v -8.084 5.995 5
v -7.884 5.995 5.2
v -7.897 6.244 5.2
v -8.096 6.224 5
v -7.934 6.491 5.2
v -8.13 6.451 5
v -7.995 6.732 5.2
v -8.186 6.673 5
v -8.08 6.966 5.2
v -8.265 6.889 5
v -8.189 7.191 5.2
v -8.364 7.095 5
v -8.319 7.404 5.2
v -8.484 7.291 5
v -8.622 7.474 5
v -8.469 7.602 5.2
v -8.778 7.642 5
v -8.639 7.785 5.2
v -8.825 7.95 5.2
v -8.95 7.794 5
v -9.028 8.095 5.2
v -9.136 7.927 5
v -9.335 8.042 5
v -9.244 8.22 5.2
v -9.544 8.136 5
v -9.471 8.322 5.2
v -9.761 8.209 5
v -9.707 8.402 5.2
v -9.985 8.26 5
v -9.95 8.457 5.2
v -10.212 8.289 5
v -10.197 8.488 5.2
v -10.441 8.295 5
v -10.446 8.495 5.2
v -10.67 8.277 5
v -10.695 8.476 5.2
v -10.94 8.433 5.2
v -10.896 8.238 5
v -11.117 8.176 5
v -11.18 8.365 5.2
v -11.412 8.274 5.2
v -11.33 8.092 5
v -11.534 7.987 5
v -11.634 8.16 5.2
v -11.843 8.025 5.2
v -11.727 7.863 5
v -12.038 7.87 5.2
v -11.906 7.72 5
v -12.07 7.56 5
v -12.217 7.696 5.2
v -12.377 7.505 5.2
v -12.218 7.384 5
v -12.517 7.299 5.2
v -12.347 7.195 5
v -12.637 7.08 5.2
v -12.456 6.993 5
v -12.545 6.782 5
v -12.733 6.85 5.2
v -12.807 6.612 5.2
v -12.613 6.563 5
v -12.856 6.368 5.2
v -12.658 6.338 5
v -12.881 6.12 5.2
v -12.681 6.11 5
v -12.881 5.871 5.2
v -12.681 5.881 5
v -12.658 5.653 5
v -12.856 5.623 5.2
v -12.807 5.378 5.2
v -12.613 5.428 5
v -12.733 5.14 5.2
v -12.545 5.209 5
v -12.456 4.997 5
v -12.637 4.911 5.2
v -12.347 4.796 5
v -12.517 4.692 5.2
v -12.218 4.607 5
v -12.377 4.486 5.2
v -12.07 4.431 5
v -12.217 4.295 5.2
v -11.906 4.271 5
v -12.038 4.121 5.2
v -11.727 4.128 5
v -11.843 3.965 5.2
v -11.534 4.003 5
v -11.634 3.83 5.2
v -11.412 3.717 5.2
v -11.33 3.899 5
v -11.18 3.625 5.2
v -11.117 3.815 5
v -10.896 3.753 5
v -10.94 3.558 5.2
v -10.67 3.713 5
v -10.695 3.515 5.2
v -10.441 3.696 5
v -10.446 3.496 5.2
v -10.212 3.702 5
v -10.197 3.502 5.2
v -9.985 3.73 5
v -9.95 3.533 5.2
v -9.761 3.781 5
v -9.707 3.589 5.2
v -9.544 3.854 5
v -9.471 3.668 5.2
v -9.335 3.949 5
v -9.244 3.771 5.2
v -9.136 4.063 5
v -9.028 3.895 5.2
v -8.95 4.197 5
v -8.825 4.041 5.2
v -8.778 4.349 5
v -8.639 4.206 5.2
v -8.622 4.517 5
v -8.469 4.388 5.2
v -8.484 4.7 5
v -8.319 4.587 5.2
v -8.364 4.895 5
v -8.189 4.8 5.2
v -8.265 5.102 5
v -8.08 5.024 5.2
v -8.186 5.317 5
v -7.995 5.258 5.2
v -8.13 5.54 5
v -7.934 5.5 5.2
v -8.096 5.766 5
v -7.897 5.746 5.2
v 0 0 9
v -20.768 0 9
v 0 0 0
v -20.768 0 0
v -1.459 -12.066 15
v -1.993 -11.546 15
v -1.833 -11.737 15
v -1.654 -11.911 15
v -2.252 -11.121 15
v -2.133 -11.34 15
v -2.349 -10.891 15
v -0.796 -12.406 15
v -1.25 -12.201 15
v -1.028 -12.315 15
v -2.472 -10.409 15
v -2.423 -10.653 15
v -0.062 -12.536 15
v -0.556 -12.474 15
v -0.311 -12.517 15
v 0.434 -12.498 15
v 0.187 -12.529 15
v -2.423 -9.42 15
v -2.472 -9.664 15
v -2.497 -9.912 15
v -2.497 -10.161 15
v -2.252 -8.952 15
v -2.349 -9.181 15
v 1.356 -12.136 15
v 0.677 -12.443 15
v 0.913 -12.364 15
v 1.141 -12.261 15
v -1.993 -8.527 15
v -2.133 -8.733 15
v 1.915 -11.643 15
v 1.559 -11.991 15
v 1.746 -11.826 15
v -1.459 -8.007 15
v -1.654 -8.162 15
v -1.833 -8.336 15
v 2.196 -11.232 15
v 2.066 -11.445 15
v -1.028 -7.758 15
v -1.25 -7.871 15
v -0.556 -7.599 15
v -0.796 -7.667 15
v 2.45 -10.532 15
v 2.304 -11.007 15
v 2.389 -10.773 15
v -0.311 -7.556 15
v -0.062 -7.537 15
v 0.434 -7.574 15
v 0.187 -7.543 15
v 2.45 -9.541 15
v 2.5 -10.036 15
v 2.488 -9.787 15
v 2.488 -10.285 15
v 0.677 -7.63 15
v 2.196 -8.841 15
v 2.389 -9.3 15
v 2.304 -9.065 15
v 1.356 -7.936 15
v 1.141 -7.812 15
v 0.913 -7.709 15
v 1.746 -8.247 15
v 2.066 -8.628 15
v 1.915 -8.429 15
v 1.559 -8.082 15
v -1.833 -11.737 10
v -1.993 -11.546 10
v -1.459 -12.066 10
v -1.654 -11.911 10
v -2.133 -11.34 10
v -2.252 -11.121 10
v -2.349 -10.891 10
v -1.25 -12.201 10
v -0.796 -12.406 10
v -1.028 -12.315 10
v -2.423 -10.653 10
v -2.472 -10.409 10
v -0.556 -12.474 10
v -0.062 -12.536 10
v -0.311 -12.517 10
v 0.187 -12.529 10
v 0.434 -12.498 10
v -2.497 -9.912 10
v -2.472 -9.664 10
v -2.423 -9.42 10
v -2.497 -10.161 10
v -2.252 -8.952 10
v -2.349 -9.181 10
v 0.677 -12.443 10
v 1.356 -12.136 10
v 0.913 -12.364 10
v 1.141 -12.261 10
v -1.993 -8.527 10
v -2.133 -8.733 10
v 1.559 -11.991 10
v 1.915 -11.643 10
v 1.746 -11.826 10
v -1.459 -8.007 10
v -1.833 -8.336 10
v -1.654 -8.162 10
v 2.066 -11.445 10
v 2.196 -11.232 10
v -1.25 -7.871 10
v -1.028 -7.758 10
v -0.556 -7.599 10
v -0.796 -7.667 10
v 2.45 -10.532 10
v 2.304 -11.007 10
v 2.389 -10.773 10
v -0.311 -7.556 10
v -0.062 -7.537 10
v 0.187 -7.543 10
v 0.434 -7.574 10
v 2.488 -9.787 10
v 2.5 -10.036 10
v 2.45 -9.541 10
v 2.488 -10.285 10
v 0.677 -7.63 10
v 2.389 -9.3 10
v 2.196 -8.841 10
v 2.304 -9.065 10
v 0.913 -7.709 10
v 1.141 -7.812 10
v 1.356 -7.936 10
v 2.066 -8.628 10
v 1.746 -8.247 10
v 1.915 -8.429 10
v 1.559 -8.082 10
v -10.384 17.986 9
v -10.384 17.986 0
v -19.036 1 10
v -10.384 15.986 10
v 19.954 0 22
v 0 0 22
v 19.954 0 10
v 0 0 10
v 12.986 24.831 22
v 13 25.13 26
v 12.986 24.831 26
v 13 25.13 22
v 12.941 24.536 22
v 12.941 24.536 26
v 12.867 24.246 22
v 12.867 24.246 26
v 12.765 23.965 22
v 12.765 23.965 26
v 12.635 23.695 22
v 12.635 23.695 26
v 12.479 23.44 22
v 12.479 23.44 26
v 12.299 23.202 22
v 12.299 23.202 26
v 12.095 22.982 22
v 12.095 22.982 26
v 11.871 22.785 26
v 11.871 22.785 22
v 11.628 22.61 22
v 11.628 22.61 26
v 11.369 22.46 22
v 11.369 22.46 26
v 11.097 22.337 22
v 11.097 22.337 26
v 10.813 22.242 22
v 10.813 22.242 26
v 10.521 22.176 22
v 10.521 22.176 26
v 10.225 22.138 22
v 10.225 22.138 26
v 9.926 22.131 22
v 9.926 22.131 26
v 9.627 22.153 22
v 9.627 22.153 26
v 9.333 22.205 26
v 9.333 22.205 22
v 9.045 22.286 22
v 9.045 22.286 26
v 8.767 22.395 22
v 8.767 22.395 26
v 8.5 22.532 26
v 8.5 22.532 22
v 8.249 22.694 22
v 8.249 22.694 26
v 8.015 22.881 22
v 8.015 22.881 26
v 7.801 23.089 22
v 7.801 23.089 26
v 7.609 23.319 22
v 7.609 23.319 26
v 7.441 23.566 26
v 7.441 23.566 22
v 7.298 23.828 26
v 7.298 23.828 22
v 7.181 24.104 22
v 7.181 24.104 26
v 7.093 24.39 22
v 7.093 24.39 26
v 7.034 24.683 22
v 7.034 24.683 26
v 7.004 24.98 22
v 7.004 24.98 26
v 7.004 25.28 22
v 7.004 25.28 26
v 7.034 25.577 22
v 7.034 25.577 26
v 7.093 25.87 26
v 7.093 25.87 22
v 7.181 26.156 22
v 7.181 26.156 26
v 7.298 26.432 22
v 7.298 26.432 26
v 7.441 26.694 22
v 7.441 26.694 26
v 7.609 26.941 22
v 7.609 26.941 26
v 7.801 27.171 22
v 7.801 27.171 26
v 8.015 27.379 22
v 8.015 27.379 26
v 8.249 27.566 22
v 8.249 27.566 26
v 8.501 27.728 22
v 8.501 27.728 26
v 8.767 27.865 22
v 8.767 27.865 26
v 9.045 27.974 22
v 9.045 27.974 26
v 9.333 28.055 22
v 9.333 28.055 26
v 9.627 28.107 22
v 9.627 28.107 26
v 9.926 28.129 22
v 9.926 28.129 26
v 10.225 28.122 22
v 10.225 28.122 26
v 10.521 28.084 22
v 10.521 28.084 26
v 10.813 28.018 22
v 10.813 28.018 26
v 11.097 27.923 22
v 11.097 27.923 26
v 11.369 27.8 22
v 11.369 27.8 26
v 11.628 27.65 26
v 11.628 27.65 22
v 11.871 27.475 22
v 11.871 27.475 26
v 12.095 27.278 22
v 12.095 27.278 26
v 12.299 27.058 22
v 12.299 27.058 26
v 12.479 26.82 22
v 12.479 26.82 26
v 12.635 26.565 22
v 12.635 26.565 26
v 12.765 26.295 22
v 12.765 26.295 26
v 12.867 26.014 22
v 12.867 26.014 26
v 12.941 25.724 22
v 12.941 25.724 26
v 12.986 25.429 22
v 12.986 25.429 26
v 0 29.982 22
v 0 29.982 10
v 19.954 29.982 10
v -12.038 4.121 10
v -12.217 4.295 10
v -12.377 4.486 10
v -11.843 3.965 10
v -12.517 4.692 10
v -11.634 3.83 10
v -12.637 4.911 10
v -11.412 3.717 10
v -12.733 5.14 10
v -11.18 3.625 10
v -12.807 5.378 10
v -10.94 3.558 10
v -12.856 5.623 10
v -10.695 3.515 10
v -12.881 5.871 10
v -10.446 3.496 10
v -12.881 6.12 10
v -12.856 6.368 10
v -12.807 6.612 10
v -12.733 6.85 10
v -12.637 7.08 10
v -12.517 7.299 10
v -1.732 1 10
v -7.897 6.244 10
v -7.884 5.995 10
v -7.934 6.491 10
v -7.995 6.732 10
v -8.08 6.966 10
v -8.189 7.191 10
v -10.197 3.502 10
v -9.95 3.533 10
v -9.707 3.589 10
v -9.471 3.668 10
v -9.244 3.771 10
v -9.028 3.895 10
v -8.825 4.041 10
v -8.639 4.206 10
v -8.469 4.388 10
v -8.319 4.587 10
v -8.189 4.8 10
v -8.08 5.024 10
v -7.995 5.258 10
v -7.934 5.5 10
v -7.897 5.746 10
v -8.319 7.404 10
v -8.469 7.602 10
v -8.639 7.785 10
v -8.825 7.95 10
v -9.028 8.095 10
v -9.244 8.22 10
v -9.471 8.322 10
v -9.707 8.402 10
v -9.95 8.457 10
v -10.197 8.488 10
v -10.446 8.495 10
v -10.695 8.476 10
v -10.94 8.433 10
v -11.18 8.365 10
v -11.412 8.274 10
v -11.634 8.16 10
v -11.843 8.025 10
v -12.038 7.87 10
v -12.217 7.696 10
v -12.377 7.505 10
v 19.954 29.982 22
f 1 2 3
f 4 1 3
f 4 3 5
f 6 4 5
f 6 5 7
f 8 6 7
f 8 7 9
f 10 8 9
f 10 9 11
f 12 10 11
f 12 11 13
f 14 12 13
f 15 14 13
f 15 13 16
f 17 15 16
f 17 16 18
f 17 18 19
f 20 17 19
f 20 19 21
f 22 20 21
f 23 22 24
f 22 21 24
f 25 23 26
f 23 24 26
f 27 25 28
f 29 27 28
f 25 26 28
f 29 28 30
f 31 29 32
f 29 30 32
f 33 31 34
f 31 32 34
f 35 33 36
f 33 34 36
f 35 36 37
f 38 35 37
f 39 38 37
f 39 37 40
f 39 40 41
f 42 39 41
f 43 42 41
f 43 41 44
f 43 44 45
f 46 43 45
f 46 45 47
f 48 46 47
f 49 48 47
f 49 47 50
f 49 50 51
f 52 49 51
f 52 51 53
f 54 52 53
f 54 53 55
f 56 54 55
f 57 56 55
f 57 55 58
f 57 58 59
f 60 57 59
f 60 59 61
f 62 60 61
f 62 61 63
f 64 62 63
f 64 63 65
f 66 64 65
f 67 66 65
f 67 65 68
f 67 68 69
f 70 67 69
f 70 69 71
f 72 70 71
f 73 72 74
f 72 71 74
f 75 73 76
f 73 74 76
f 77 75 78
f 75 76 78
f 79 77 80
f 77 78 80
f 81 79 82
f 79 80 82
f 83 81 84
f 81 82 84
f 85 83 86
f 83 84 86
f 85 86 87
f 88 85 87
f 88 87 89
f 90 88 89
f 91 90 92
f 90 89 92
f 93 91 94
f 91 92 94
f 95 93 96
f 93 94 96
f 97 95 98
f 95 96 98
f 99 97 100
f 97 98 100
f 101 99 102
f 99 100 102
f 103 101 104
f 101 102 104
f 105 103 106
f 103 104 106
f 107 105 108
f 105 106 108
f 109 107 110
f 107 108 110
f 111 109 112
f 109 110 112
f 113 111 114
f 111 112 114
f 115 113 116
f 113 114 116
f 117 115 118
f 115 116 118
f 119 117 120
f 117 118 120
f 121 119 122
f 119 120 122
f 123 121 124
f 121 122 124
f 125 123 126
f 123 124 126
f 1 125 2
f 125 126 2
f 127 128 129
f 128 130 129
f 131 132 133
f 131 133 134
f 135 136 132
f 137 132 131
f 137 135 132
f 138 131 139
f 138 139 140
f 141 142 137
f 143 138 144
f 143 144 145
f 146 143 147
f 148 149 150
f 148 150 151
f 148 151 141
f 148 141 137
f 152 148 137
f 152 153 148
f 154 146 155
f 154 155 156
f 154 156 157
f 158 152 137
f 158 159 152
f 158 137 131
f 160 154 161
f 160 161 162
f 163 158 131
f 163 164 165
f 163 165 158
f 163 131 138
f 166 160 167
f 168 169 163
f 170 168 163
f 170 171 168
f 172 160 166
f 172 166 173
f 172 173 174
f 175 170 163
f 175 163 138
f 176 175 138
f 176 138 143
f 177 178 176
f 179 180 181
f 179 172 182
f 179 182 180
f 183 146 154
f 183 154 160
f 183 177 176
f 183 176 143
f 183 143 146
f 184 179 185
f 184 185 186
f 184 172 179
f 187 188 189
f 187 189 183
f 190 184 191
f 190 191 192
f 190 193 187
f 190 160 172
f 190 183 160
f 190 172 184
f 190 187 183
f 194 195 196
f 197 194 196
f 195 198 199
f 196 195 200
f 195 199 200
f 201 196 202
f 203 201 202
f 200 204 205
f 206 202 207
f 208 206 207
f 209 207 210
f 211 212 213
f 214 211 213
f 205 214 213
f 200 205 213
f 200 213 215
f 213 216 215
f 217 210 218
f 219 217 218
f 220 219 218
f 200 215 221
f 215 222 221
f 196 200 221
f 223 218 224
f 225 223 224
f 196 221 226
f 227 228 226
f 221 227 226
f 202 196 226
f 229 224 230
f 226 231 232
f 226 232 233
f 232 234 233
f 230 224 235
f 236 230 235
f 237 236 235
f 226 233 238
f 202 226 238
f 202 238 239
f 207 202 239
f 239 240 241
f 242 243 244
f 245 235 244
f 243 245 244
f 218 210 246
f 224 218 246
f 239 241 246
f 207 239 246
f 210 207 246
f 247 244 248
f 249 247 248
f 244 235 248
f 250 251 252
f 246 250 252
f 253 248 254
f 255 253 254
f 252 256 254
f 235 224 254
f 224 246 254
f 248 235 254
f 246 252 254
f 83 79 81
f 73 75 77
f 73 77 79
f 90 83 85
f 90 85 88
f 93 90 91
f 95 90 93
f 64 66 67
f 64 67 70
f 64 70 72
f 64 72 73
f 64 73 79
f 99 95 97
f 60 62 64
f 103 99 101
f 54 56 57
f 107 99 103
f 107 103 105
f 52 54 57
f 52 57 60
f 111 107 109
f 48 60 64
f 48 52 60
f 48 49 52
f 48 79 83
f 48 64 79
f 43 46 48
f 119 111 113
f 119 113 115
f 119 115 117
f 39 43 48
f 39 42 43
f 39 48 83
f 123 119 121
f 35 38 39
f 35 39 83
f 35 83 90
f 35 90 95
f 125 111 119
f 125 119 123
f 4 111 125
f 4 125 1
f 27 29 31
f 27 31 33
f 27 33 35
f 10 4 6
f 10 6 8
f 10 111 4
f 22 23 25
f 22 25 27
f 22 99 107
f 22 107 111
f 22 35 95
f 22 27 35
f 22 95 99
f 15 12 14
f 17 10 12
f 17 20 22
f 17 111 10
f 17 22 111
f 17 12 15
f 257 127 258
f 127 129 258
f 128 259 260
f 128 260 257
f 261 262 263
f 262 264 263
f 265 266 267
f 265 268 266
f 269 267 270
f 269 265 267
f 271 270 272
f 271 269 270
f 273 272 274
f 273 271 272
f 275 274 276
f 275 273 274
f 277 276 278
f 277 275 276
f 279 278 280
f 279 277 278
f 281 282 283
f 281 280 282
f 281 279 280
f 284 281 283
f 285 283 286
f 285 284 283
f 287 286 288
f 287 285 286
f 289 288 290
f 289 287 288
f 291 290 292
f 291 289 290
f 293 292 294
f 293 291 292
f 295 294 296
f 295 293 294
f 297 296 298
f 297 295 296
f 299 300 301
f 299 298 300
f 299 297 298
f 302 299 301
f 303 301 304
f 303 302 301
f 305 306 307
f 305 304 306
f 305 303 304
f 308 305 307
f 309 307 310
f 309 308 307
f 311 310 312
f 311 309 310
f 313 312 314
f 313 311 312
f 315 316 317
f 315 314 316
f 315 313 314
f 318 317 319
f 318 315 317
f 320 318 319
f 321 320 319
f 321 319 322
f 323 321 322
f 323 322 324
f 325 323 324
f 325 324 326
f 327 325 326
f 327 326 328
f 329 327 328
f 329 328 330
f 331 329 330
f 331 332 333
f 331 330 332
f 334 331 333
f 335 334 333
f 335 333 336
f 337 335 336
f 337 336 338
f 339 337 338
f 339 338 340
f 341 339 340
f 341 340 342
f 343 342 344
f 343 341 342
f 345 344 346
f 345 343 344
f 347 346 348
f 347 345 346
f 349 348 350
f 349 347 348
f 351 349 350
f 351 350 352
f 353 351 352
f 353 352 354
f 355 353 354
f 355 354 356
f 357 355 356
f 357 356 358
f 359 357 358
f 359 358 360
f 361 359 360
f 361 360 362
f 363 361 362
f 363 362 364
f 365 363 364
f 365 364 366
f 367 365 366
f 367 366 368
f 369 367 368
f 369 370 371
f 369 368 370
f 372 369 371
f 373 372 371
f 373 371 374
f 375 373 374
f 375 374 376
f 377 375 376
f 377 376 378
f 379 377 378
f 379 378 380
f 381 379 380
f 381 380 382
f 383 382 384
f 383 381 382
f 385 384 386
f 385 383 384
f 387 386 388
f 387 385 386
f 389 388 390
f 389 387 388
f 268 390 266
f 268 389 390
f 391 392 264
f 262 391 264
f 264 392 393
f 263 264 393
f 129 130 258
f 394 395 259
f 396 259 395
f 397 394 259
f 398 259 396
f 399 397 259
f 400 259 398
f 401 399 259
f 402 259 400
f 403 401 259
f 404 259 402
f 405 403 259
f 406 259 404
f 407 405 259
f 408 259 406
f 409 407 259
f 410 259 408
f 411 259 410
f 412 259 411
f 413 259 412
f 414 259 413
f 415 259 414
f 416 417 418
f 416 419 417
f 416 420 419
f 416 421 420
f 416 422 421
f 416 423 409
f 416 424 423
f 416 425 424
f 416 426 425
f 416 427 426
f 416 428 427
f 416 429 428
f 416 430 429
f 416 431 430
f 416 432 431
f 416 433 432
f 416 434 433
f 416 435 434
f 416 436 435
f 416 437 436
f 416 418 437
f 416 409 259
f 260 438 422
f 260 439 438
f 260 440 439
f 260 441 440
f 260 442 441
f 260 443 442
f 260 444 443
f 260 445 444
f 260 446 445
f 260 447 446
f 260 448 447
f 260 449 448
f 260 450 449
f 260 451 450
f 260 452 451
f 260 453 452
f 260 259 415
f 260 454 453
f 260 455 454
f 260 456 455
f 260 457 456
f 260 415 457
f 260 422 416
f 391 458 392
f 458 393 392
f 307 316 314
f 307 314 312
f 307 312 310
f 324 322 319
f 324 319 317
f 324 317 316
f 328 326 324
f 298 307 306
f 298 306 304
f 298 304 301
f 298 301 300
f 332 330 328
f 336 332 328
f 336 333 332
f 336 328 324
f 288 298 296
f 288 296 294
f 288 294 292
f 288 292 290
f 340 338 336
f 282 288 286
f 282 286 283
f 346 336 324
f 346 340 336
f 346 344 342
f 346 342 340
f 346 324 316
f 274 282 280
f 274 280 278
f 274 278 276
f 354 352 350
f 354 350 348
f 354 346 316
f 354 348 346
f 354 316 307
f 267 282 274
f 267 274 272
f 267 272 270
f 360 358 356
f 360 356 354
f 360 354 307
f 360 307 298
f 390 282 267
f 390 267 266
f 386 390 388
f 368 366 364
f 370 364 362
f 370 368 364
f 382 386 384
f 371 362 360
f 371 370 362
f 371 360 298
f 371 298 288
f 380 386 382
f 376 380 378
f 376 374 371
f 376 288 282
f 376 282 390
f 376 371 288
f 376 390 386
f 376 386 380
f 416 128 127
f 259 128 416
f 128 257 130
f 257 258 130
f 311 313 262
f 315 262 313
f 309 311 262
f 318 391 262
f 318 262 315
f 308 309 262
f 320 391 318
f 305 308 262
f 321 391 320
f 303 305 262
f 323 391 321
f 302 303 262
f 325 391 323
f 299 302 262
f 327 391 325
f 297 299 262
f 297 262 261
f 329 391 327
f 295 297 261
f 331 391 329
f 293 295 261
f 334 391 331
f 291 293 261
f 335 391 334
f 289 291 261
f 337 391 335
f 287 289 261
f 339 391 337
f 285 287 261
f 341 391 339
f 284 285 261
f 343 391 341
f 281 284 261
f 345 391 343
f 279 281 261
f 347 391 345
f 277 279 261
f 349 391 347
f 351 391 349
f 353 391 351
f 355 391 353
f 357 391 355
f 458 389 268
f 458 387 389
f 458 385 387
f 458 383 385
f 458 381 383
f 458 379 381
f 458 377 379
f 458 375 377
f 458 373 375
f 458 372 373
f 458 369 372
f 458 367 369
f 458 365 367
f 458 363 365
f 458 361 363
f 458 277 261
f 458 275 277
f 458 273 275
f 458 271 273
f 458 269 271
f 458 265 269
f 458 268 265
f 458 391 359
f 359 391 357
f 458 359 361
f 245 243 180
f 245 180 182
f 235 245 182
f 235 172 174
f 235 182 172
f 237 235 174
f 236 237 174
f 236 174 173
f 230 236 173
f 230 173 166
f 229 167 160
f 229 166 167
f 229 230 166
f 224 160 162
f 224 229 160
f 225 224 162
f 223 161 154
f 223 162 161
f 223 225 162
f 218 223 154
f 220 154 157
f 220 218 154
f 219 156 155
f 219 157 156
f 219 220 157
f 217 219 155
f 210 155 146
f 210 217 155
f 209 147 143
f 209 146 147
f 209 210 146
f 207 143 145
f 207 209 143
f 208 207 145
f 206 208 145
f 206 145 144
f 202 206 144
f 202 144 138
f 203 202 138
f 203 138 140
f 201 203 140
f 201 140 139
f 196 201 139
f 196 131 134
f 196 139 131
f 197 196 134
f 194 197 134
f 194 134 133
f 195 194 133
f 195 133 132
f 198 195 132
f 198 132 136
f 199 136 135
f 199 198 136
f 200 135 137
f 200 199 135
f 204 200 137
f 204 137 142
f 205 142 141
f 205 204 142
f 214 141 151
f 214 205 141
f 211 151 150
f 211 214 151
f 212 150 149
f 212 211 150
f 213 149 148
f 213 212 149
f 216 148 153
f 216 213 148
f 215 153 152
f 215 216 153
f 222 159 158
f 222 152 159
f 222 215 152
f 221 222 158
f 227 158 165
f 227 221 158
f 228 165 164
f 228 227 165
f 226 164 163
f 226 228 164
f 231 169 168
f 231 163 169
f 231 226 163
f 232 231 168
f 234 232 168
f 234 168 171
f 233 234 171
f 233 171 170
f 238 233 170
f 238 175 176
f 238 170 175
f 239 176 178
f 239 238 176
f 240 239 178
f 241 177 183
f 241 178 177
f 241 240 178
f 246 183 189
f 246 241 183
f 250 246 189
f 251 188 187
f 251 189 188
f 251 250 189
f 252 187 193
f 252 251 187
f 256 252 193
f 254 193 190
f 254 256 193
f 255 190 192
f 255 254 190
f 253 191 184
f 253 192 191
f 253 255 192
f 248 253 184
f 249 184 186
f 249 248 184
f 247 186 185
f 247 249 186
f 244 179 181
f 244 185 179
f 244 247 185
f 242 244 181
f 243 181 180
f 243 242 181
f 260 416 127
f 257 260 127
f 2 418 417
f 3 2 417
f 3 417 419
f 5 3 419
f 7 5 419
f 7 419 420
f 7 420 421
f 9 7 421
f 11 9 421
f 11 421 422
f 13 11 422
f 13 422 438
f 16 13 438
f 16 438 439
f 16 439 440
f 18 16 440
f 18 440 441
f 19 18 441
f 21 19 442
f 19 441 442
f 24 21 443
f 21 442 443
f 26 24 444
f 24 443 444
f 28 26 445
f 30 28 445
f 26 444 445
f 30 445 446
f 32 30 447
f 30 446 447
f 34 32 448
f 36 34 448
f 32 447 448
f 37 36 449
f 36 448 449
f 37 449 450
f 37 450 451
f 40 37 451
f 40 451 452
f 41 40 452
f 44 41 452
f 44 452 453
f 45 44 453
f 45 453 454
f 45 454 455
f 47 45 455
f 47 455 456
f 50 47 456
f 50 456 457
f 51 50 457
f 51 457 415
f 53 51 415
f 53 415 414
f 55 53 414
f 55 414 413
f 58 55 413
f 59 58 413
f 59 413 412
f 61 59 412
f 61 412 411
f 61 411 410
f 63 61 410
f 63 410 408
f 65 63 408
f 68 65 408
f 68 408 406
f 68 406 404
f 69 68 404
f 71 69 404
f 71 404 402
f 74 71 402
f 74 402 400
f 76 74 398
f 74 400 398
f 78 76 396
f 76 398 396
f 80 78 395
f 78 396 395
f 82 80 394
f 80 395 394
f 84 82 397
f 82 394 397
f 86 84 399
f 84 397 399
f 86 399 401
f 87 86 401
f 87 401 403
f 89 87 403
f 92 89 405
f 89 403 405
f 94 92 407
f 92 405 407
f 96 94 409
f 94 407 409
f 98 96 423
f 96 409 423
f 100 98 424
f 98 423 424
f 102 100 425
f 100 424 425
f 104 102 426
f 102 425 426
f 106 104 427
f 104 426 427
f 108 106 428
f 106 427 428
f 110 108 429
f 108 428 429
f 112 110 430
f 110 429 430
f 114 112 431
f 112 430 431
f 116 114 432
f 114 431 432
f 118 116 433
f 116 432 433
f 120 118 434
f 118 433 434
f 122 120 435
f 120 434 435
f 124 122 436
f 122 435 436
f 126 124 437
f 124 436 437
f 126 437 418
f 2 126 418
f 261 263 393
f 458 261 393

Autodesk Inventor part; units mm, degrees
ref_plane "YZ Plane" through (0, 0, 0) normal (1, 0, 0) x (0, 1, 0)
ref_plane "XZ Plane" through (0, 0, 0) normal (0, 1, 0) x (-1, 0, 0)
ref_plane "XY Plane" through (0, 0, 0) normal (0, 0, 1) x (1, 0, 0)
sketch "スケッチ2" plane through (0, 0, 0) normal (0, 0, 1) x (1, 0, 0)
  point P0 (0, 0)
sketch "スケッチ3" plane through (0, 0, 0) normal (0, 0, 1) x (1, 0, 0)
  point P0 (0, 0)
sketch "スケッチ4" plane through (0, 0, 0) normal (0, 0, 1) x (1, 0, 0)
  line L0 (-20.7682, 0) -> (0, 0)
  line L1 (0, 0) -> (-10.3841, 17.9858)
  line L2 (-10.3841, 17.9858) -> (-20.7682, 0)
  point P0 (-10.3841, 0)
extrude "押し出し1" add sketch "スケッチ4" along normal blind 10
chamfer "面取り1" distance 1 angle 45 1 edges at (-5.1921, 8.9929, 10)
chamfer "面取り2" distance 1 angle 45 2 edges at (-15.8649, 8.4929, 10) (-10.9615, 0, 10)
sketch "スケッチ5" plane through (0, 0, 10) normal (0, 0, 1) x (1, 0, 0)
  line L0 (-10.3841, 15.9858) -> (-10.3841, 17.9858) projected
  circle A0 centre (-10.3841, 5.9953) radius 2.5
  line L1 (-1.7321, 1) -> (-19.0362, 1) projected
  line L2 (-10.3841, 15.9858) -> (-1.7321, 1) projected
  point P0 (0, 0)
  dimension "d9" = 5
extrude "押し出し2" cut sketch "スケッチ5" against normal blind 5
chamfer "面取り3" distance 0.2 angle 45 1 edges at (-12.8841, 5.9953, 5)
thread "ねじ1" size "M5x0.8" class "6H" standard "ANSI Metric M Profile" full length
sketch "スケッチ6" plane through (0, 0, 10) normal (0, 0, 1) x (1, 0, 0)
  circle A0 centre (0, -10.0364) radius 2.5
  point P0 (0, 0)
  dimension "d17" = 5
extrude "押し出し3" add sketch "スケッチ6" along normal blind 5
thread "ねじ2" size "M5x0.8" class "6g" standard "ANSI Metric M Profile" full length
sketch "スケッチ7" plane through (0, -10.0364, 15) normal (0, 0, 1) x (1, 0, 0)
  point P0 (0, 10.0364)
sketch "スケッチ8" plane through (0, 0, 10) normal (0, 0, 1) x (1, 0, 0)
  point P0 (0, 0)
sketch "スケッチ9" plane through (-20.7682, 0, 9) normal (0, -0.7071, 0.7071) x (1, 0, 0)
  point P0 (20.7682, -6.364)
sketch "スケッチ10" plane through (-20.7682, 0, 0) normal (0, -1, 0) x (1, 0, 0)
  point P0 (20.7682, 0)
sketch "スケッチ11" plane through (0, 0, 10) normal (0, 0, 1) x (1, 0, 0)
  line L0 (0, 0) -> (-1.7321, 1) projected
  line L1 (0, 0) -> (19.954, 0)
  line L2 (19.954, 0) -> (19.954, 29.9824)
  line L3 (19.954, 29.9824) -> (0, 29.9824)
  line L4 (0, 29.9824) -> (0, 0)
extrude "押し出し4" add sketch "スケッチ11" along normal blind 12
sketch "スケッチ12" plane through (0, 0, 22) normal (0, 0, 1) x (1, 0, 0)
  point P0 (0, 0)
sketch "スケッチ13" plane through (0, 0, 22) normal (0, 0, 1) x (1, 0, 0)
  circle A0 centre (10.0005, 25.13) radius 3
  point P0 (0, 0)
  dimension "d24" = 6
extrude "押し出し5" add sketch "スケッチ13" along normal blind 4
sketch "スケッチ14" plane through (0, 0, 22) normal (0, 0, 1) x (1, 0, 0)
  point P0 (0, 0)
